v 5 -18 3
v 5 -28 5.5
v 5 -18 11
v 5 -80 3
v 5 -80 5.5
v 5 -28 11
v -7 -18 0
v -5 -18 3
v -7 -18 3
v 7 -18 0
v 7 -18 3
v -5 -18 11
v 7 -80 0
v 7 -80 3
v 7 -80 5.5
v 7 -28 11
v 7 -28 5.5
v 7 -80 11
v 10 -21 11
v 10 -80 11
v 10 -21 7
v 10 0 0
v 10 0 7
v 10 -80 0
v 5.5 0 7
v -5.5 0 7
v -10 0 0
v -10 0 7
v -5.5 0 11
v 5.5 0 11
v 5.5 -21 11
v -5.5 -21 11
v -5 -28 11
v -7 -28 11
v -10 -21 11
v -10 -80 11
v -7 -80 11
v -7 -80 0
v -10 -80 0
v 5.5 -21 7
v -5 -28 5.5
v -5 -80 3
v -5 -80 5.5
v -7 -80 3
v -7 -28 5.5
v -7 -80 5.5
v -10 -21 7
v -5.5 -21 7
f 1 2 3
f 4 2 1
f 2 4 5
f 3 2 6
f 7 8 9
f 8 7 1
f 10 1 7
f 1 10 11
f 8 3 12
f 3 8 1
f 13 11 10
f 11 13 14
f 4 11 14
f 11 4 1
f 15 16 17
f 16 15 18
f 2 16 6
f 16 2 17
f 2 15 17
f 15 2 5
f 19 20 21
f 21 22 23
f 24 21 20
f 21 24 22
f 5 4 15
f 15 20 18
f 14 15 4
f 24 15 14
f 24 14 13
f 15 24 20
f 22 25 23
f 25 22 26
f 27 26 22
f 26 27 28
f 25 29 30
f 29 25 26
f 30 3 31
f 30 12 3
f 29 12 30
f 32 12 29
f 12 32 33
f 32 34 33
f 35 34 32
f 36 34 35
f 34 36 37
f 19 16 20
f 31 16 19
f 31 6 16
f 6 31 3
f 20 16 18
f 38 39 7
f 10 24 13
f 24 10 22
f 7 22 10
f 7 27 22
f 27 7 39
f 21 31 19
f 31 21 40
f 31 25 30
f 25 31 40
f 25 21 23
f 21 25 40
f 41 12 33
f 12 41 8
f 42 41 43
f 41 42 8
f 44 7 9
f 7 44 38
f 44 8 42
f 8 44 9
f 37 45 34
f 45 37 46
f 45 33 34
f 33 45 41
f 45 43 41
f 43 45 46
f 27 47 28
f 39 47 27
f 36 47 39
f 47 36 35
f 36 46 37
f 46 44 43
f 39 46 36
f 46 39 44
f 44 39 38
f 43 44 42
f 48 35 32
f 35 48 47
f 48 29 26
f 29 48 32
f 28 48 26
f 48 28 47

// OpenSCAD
/**
 * This work is licensed under a <a rel="license" href="https://creativecommons.org/licenses/by-sa/4.0/">Creative Commons Attribution 4.0 Unported License</a>.
 * You can find this on thingiverse: http://www.thingiverse.com/thing:1876674
 */

/* 
Mesures:
aspirateur: 14 => 20 => h = 21 , d = 11
balai: 8 => 12 => h = 70 , d = 17
*/

// Hoover small width
hv_sw = 14.5;
// Hoover big width
hv_bw = 20;
// Hoover depth
hv_de = 11;
// Hoover height
hv_he = 21;
// Hoover thickness = 3
hv_th = 4;

// Broom small width
br_sw = 8;
// Broom big width
br_bw = 12;
// Broom depth
br_de = 17;
// Broom height
br_he = 70;
// Broom thickness = 2
br_th = 2;
// Broom inside thickness = 3.5
br_it = 3.5;

// Total height
to_he = 80;
// margin
ma = 2;

module half() {
    difference() { 
        cube([hv_bw/2, hv_de, to_he]);
        translate([hv_bw-hv_sw, hv_de-hv_th, -ma]) {
               cube([hv_sw+ma, hv_de+ma, hv_he+ma]);
        }
        translate([-ma, -ma, 18]) {
            cube([br_sw/2+ma+1, br_de, br_he+ma]);
            cube([br_bw/2+ma+1, br_th+ma+ma/2, br_he+ma]);
            translate([0, br_th++ma+br_it, 10]) {
                cube([br_bw/2+ma+1, br_de, br_he+ma]);
            }
        }
    }
}

rotate([90, 0, 0]) {
    union() {
        half();
        mirror() {
            half();
        }
    }
}
